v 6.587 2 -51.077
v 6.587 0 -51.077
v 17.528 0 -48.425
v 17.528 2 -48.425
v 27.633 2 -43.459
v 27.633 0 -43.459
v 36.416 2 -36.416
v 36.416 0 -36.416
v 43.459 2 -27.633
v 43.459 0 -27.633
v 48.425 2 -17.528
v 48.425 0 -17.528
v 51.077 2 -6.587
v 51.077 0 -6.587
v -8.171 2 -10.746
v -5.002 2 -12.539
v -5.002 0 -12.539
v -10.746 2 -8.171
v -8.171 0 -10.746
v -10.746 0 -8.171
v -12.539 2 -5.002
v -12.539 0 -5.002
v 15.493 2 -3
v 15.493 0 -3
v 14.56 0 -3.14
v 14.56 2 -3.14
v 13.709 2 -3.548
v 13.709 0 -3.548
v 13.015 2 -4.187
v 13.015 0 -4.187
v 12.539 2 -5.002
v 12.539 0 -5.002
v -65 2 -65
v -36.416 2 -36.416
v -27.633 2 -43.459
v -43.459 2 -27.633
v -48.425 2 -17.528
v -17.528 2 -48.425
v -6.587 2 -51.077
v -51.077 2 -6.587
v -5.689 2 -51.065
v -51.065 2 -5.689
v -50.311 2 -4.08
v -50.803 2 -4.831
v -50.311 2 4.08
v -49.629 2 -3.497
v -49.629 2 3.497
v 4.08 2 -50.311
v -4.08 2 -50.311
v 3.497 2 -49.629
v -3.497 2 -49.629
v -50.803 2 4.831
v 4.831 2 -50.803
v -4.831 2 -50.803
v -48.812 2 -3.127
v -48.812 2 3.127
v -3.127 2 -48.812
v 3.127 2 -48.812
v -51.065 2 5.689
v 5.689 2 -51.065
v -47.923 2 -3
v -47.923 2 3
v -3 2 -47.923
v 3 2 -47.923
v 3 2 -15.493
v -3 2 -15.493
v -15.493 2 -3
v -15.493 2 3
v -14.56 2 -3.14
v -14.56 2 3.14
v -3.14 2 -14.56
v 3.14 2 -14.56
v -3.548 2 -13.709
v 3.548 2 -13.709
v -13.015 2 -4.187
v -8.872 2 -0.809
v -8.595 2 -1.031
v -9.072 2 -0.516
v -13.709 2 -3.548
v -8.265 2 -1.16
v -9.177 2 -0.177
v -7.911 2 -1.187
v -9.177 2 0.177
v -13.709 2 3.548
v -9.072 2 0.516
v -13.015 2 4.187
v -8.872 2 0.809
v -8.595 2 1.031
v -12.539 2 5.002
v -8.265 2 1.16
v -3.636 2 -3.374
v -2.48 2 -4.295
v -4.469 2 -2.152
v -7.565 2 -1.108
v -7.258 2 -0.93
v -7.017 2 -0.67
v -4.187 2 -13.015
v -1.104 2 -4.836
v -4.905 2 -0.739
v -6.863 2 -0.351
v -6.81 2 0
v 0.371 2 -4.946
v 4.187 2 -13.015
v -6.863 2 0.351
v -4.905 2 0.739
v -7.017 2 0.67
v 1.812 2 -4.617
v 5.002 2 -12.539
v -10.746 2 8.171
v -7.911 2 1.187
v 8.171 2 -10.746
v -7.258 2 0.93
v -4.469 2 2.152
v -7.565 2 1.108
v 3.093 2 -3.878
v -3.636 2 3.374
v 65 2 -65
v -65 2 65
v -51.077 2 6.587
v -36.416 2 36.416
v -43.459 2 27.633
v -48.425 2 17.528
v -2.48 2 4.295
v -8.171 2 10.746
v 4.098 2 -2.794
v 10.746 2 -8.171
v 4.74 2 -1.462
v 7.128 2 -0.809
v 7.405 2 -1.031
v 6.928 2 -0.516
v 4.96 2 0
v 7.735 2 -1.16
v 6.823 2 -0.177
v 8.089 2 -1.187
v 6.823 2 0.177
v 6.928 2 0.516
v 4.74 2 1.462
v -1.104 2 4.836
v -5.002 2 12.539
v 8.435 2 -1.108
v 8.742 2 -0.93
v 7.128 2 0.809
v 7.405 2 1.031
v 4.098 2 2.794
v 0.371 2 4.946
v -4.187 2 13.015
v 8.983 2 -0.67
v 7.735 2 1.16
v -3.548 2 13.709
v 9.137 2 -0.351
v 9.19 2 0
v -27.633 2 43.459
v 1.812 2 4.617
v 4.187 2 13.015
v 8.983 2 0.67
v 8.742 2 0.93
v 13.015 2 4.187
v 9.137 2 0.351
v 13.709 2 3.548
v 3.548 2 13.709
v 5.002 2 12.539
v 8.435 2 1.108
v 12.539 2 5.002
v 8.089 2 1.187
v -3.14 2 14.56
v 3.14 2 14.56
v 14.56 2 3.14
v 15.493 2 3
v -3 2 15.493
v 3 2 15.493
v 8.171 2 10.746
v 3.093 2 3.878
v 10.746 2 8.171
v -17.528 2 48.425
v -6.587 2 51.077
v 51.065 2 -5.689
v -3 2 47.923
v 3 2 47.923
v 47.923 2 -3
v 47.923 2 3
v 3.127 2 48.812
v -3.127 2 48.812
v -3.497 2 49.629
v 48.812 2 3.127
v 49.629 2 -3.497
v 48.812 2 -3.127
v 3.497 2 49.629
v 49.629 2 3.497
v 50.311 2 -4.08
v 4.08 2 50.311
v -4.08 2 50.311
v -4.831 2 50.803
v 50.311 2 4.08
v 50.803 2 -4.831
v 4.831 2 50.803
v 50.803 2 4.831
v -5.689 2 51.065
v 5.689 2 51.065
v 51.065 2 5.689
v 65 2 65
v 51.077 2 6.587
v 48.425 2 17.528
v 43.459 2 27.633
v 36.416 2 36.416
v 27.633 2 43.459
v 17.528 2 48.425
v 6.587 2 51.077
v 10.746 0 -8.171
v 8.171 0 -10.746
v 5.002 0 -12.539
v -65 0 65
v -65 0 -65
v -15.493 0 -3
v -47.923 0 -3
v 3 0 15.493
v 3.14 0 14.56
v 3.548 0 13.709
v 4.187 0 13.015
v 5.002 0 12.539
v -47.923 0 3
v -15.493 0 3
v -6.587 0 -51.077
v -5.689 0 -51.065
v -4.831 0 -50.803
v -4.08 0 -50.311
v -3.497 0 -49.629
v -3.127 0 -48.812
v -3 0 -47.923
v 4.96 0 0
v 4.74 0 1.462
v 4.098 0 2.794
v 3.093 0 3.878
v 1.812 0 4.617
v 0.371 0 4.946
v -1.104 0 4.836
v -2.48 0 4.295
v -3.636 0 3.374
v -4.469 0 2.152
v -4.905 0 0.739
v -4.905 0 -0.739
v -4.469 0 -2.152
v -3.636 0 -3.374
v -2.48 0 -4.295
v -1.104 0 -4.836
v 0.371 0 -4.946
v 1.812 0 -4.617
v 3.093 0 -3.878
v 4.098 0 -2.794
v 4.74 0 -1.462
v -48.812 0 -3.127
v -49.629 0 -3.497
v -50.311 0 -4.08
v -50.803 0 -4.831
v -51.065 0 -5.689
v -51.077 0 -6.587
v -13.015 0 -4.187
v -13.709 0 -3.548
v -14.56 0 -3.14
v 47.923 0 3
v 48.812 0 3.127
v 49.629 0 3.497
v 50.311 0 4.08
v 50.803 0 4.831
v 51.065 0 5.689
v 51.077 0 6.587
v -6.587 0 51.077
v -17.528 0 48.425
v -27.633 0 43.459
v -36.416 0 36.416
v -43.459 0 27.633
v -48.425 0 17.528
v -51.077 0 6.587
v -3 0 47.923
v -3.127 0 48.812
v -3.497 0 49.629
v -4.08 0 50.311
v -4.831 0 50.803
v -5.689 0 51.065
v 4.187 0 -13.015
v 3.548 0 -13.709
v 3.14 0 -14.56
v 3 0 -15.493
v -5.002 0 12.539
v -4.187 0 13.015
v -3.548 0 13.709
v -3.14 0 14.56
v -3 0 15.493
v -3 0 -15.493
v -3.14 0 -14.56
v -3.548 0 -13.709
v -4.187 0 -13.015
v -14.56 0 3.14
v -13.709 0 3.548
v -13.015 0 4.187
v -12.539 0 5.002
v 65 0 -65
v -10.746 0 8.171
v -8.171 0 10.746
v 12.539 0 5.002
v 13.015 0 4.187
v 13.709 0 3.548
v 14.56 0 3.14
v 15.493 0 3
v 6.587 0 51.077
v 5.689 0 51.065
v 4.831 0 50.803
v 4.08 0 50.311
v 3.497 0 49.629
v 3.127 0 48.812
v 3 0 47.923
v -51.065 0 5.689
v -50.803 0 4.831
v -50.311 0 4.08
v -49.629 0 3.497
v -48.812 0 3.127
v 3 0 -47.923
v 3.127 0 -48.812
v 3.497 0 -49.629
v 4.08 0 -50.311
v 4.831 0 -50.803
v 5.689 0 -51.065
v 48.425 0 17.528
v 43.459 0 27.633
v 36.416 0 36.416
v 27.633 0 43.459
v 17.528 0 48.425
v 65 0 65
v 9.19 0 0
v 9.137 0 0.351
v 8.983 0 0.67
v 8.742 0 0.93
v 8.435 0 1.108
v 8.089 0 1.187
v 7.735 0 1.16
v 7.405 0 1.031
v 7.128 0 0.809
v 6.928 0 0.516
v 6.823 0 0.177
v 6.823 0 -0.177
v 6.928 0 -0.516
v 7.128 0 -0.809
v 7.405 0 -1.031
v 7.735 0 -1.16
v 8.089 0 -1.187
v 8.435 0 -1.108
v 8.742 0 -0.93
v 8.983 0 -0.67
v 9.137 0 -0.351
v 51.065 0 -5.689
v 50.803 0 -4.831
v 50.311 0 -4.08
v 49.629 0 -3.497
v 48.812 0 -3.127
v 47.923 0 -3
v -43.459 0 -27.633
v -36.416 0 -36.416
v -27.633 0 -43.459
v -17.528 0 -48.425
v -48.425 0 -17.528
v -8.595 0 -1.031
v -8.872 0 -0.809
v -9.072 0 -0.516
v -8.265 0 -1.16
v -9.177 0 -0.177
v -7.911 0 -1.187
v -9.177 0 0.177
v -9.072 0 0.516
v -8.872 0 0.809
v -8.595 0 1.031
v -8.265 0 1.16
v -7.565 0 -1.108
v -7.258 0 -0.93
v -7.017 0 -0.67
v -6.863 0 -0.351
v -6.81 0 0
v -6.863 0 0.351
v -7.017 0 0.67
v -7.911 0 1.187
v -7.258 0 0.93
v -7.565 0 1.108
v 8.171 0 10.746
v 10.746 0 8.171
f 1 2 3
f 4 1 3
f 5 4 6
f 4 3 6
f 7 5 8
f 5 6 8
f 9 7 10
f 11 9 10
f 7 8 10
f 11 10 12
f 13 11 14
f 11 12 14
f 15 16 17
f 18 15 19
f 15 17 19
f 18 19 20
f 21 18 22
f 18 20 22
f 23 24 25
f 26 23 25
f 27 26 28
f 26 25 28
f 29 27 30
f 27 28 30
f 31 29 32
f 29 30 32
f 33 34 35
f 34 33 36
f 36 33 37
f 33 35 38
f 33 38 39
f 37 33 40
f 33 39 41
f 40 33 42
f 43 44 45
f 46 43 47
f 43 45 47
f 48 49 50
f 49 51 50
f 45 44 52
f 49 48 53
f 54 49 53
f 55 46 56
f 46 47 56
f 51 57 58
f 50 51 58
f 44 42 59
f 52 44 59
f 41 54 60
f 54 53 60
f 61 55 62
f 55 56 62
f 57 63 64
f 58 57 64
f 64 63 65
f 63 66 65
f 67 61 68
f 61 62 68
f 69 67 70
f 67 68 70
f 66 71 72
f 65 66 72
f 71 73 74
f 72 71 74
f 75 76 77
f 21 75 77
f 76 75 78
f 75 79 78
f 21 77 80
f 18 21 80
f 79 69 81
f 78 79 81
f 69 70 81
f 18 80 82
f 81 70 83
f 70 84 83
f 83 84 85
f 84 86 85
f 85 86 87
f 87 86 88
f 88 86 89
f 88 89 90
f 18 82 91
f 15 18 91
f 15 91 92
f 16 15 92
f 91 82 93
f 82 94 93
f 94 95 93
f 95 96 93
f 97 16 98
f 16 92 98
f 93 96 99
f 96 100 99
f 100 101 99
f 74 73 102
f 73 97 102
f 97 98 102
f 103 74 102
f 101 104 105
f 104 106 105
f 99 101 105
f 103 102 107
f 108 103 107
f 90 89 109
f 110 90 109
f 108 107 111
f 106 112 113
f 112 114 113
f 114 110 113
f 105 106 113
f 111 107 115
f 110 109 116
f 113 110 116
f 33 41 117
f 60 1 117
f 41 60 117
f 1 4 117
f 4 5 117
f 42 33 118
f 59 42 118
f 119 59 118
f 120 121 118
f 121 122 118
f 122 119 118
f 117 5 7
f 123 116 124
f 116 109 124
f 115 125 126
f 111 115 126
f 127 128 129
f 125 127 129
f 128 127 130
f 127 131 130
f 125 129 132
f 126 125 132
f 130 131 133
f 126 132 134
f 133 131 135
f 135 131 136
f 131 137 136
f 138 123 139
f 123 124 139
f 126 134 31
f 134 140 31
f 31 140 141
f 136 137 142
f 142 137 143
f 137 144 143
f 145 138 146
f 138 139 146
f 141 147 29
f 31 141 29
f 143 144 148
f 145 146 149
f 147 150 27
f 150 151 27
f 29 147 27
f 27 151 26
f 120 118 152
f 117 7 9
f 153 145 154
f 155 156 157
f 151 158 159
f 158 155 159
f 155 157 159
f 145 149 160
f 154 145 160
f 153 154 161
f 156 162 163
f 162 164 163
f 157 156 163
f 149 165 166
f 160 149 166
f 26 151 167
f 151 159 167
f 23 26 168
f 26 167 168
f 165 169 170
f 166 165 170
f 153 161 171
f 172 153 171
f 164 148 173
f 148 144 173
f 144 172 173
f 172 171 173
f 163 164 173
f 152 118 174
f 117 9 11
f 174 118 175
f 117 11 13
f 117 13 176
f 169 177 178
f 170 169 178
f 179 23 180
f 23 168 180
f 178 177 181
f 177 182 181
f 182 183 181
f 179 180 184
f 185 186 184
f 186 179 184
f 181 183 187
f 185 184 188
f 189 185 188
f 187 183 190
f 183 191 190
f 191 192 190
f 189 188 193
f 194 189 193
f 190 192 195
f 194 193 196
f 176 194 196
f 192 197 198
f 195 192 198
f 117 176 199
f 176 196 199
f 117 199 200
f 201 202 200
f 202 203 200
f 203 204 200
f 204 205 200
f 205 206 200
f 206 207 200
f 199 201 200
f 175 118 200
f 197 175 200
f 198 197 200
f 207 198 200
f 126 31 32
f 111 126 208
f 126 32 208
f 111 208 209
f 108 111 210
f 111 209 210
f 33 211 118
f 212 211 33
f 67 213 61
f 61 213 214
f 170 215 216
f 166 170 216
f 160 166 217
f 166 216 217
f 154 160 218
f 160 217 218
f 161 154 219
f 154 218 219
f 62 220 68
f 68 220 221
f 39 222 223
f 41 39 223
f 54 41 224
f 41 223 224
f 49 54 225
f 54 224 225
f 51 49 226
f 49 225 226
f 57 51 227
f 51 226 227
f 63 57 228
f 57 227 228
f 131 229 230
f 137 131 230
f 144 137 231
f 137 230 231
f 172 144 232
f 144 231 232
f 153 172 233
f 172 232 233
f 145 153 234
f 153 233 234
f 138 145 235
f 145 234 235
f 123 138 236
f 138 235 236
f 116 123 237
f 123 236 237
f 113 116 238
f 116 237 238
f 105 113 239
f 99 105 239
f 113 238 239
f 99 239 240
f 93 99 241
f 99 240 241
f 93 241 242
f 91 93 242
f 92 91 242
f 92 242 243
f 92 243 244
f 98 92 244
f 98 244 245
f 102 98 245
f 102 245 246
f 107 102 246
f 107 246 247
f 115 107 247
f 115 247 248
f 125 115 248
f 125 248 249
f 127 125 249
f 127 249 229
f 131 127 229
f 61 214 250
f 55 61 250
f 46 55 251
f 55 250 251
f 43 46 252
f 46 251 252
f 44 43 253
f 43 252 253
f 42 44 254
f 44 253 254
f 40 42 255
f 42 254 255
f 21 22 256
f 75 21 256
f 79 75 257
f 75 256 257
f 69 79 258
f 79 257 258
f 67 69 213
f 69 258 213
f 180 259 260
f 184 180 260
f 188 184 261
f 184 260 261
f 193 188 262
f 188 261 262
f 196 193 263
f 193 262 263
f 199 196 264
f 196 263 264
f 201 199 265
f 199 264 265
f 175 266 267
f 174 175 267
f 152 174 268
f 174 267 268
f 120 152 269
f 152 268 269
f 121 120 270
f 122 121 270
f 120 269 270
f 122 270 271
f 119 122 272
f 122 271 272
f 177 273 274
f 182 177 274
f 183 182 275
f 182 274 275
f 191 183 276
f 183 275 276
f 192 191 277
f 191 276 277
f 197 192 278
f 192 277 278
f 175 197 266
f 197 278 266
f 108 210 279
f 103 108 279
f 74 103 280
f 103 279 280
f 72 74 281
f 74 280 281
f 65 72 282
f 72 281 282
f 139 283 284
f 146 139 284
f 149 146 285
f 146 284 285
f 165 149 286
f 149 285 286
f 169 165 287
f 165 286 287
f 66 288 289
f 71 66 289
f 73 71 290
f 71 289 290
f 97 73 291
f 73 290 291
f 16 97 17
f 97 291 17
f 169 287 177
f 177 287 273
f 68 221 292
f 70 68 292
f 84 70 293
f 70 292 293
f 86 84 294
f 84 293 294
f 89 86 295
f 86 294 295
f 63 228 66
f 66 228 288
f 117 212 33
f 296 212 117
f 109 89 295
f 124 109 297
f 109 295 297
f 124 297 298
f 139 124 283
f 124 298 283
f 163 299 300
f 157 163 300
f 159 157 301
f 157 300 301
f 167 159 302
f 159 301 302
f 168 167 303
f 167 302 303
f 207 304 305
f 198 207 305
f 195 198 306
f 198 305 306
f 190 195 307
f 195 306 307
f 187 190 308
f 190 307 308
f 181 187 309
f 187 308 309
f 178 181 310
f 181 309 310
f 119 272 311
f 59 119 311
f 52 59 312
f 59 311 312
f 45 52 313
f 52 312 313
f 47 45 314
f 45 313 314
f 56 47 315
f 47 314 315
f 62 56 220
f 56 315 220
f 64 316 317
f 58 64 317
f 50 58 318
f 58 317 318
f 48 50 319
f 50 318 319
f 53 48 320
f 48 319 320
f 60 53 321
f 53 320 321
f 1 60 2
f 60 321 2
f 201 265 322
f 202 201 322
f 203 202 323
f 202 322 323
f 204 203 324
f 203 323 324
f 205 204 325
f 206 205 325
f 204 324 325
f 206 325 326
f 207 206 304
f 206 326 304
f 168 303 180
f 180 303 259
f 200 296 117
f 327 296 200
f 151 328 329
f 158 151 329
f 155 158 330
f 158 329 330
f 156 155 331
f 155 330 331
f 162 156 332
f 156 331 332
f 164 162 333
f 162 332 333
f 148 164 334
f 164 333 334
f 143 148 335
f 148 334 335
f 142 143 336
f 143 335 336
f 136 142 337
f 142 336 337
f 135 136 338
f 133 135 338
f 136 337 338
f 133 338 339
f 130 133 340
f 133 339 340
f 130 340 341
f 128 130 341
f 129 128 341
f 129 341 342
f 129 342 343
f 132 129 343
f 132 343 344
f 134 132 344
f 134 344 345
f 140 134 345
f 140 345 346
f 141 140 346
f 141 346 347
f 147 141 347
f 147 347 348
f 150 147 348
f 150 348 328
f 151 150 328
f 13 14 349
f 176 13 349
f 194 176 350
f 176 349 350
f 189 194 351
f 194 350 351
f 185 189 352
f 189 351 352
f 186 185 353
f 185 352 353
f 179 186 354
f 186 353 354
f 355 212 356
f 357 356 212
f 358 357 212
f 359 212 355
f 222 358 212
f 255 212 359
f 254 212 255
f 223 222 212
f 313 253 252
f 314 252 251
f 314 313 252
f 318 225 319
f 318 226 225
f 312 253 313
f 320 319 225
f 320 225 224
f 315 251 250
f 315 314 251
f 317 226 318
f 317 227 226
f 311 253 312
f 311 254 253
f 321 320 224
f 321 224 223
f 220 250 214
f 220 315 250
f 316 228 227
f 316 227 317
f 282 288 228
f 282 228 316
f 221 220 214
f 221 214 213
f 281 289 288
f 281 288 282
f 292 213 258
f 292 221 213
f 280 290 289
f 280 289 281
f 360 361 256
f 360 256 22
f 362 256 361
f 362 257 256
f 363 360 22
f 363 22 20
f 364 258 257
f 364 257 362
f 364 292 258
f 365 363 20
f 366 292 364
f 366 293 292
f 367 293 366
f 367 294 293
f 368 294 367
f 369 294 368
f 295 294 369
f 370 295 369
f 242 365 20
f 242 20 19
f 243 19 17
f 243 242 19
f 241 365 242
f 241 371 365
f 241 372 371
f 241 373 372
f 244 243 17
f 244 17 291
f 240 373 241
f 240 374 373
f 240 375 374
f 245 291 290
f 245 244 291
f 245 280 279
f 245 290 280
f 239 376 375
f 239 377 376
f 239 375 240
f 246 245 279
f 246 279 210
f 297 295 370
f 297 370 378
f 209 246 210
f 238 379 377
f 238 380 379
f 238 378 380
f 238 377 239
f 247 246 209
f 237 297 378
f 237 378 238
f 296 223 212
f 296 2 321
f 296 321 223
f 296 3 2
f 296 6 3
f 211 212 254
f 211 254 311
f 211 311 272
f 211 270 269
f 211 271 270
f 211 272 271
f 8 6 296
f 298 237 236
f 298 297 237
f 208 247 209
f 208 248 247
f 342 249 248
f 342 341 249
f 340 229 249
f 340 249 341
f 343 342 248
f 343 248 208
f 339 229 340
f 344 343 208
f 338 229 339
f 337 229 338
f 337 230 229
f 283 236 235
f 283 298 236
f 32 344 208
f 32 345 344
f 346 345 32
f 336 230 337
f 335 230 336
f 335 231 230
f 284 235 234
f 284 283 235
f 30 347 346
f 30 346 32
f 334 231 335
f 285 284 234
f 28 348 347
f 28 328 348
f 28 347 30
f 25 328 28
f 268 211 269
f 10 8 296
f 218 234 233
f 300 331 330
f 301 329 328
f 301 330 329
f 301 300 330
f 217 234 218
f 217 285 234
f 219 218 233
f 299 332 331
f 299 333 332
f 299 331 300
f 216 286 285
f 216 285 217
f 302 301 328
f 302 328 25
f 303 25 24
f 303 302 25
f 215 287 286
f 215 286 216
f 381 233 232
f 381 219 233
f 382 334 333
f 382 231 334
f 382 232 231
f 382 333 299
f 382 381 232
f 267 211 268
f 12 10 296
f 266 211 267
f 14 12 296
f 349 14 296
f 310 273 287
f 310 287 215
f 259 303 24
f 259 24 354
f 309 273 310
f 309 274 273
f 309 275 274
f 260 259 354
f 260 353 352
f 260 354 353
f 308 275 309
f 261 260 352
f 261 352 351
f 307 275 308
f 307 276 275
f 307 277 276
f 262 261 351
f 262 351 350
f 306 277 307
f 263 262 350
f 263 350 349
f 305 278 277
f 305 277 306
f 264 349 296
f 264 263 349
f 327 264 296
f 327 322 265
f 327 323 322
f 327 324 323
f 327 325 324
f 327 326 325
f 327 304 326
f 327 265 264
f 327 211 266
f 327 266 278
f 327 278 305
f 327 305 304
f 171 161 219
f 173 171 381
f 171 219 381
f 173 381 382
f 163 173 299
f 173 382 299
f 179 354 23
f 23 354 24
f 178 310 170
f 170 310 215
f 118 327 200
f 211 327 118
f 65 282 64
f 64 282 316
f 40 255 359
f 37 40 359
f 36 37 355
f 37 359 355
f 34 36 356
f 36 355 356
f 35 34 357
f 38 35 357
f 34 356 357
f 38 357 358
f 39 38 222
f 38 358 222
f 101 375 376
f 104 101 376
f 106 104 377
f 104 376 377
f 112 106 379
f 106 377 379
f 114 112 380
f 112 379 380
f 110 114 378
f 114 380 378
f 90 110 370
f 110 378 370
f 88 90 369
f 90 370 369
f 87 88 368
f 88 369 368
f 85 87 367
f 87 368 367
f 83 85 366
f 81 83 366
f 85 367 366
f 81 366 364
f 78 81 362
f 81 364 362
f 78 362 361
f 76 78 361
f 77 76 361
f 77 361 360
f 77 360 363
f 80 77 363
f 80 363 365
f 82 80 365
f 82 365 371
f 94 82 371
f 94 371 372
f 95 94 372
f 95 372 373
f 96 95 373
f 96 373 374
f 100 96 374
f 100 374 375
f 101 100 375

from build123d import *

# Parameters (mm, degrees)
F1_DEPTH = 2
F2_R     = 1.19
F2_R_2   = 4.96
F3_DEPTH = 2.001


with BuildPart() as f1:
    # F0 (on Front) → F1 (new body)
    with BuildSketch(Plane.XZ):
        Polygon((65, 65), (0, 65), (-65, 65), (-65, -65), (0, -65), (65, -65), align=None)
    extrude(amount=-F1_DEPTH)

    # F2 (on Front) → F3 (cut, through all)
    with BuildSketch(Plane.XZ):
        with BuildLine():
            ThreePointArc((-3, 47.923168), (-4.080113, 50.311237), (-6.586714, 51.077052))
            ThreePointArc((-6.586714, 51.077052), (-36.415999, 36.415999), (-51.077052, 6.586714))
            ThreePointArc((-51.077052, 6.586714), (-50.311237, 4.080113), (-47.923168, 3))
            Line((-47.923168, 3), (-15.492902, 3))
            ThreePointArc((-15.492902, 3), (-13.708845, 3.547598), (-12.539219, 5.001799))
            ThreePointArc((-12.539219, 5.001799), (-9.545942, 9.545942), (-5.001799, 12.539219))
            ThreePointArc((-5.001799, 12.539219), (-3.547598, 13.708845), (-3, 15.492902))
            Line((-3, 15.492902), (-3, 47.923168))
        make_face()
        with BuildLine():
            ThreePointArc((6.586714, 51.077052), (4.080113, 50.311237), (3, 47.923168))
            Line((3, 47.923168), (3, 15.492902))
            ThreePointArc((3, 15.492902), (3.547598, 13.708845), (5.001799, 12.539219))
            ThreePointArc((5.001799, 12.539219), (9.545942, 9.545942), (12.539219, 5.001799))
            ThreePointArc((12.539219, 5.001799), (13.708845, 3.547598), (15.492902, 3))
            Line((15.492902, 3), (47.923168, 3))
            ThreePointArc((47.923168, 3), (50.311237, 4.080113), (51.077052, 6.586714))
            ThreePointArc((51.077052, 6.586714), (36.415999, 36.415999), (6.586714, 51.077052))
        make_face()
        with BuildLine():
            Line((-15.492902, -3), (-47.923168, -3))
            ThreePointArc((-47.923168, -3), (-50.311237, -4.080113), (-51.077052, -6.586714))
            ThreePointArc((-51.077052, -6.586714), (-36.415999, -36.415999), (-6.586714, -51.077052))
            ThreePointArc((-6.586714, -51.077052), (-4.080113, -50.311237), (-3, -47.923168))
            Line((-3, -47.923168), (-3, -15.492902))
            ThreePointArc((-3, -15.492902), (-3.547598, -13.708845), (-5.001799, -12.539219))
            ThreePointArc((-5.001799, -12.539219), (-9.545942, -9.545942), (-12.539219, -5.001799))
            ThreePointArc((-12.539219, -5.001799), (-13.708845, -3.547598), (-15.492902, -3))
        make_face()
        with BuildLine():
            ThreePointArc((5.001799, -12.539219), (3.547598, -13.708845), (3, -15.492902))
            Line((3, -15.492902), (3, -47.923168))
            ThreePointArc((3, -47.923168), (4.080113, -50.311237), (6.586714, -51.077052))
            ThreePointArc((6.586714, -51.077052), (36.415999, -36.415999), (51.077052, -6.586714))
            ThreePointArc((51.077052, -6.586714), (50.311237, -4.080113), (47.923168, -3))
            Line((47.923168, -3), (15.492902, -3))
            ThreePointArc((15.492902, -3), (13.708845, -3.547598), (12.539219, -5.001799))
            ThreePointArc((12.539219, -5.001799), (9.545942, -9.545942), (5.001799, -12.539219))
        make_face()
        with Locations((-8, 0)):
            Circle(F2_R)
        with Locations((8, 0)):
            Circle(F2_R)
        Circle(F2_R_2)
    extrude(amount=-F3_DEPTH, mode=Mode.SUBTRACT)


solid = f1.part
